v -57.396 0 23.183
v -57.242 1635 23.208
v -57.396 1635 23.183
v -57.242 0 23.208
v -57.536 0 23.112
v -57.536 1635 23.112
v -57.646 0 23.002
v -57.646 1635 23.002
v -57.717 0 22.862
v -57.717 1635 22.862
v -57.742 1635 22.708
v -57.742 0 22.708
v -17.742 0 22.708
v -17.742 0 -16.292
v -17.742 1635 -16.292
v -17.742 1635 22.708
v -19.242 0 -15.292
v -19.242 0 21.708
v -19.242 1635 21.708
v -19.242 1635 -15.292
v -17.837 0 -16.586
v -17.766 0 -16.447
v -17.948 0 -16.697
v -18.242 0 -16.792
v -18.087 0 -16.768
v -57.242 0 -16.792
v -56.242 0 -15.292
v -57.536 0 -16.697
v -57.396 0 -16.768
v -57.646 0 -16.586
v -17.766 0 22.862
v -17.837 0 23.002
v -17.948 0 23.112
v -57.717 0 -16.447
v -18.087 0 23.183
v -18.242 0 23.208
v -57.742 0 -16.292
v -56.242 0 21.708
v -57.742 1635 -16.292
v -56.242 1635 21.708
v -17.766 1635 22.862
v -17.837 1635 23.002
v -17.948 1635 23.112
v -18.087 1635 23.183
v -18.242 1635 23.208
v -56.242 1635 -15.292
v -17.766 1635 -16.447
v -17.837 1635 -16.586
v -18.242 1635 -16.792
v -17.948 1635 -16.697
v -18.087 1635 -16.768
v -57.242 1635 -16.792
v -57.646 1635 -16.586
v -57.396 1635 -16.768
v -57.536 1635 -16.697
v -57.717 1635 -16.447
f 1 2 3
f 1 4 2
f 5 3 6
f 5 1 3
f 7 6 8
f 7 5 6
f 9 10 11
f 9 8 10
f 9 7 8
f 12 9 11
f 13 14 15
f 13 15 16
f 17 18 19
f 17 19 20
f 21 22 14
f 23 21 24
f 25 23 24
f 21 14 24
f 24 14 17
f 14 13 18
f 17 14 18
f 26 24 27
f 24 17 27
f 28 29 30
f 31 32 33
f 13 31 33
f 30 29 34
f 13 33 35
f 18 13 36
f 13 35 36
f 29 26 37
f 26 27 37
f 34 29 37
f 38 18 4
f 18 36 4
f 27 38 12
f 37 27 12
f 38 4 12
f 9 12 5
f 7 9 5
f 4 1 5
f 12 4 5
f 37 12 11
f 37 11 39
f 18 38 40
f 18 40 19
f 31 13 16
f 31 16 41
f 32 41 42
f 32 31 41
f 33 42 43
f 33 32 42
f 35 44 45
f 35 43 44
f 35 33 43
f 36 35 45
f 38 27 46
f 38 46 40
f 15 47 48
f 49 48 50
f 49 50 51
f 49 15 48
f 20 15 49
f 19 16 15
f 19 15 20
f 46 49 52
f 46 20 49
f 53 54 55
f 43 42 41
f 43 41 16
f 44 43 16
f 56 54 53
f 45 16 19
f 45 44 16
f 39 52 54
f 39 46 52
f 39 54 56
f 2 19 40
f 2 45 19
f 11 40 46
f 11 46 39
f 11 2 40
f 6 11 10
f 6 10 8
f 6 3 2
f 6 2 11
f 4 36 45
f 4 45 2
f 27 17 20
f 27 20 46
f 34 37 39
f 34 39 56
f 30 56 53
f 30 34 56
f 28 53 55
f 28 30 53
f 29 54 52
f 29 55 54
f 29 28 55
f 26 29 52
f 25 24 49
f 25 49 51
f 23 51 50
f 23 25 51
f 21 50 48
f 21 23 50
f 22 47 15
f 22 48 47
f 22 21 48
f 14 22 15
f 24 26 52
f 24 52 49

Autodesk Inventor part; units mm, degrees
ref_plane "YZ Plane" through (0, 0, 0) normal (1, 0, 0) x (0, 1, 0)
ref_plane "XZ Plane" through (0, 0, 0) normal (0, 1, 0) x (-1, 0, 0)
ref_plane "XY Plane" through (0, 0, 0) normal (0, 0, 1) x (1, 0, 0)
sketch "Sketch1" plane through (0, 0, 0) normal (0, 1, 0) x (-1, 0, 0)
  line L0 (18.2419, 23.2079) -> (57.2419, 23.2079)
  line L1 (57.7419, 22.7079) -> (57.7419, -16.2921)
  line L2 (57.2419, -16.7921) -> (18.2419, -16.7921)
  line L3 (17.7419, -16.2921) -> (17.7419, 22.7079)
  line L4 (56.2419, 21.7079) -> (19.2419, 21.7079)
  line L5 (19.2419, 21.7079) -> (19.2419, -15.2921)
  line L6 (19.2419, -15.2921) -> (56.2419, -15.2921)
  line L7 (56.2419, -15.2921) -> (56.2419, 21.7079)
  arc A0 (18.2419, 23.2079) -> (17.7419, 22.7079) centre (18.2419, 22.7079) ccw
  arc A1 (57.7419, 22.7079) -> (57.2419, 23.2079) centre (57.2419, 22.7079) ccw
  arc A2 (57.2419, -16.7921) -> (57.7419, -16.2921) centre (57.2419, -16.2921) ccw
  arc A3 (17.7419, -16.2921) -> (18.2419, -16.7921) centre (18.2419, -16.2921) ccw
  point P0 (0, 0)
  point P1 (17.7419, 23.2079)
  point P2 (57.7419, 23.2079)
  point P3 (57.7419, -16.7921)
  dimension "d0" = 40
  dimension "d1" = 40
  dimension "d2" = 1.5
  dimension "d3" = 0.5
extrude "Extrusion1" add sketch "Sketch1" along normal blind 1635
properties part number "Metalon_Base_2"
